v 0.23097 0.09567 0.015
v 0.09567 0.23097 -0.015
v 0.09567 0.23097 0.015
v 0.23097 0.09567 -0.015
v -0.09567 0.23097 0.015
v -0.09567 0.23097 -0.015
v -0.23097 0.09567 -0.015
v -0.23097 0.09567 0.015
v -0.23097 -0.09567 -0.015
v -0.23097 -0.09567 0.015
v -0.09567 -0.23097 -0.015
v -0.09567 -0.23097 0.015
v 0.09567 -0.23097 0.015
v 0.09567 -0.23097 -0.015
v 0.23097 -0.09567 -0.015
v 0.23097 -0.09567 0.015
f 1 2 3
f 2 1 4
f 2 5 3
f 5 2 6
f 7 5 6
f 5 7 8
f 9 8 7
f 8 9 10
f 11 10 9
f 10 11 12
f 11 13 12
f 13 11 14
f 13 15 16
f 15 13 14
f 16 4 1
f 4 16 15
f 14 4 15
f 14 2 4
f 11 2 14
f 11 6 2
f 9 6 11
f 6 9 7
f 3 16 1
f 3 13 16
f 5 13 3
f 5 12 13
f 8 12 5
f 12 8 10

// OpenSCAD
use <lib.scad>

hd = 72;
ld = 12;

module waypointHD() {
	rotate([0,0,22.5]) cyl(0.25, 0.25, 0.03, $fn=8);
}

waypointHD($fn=hd);
